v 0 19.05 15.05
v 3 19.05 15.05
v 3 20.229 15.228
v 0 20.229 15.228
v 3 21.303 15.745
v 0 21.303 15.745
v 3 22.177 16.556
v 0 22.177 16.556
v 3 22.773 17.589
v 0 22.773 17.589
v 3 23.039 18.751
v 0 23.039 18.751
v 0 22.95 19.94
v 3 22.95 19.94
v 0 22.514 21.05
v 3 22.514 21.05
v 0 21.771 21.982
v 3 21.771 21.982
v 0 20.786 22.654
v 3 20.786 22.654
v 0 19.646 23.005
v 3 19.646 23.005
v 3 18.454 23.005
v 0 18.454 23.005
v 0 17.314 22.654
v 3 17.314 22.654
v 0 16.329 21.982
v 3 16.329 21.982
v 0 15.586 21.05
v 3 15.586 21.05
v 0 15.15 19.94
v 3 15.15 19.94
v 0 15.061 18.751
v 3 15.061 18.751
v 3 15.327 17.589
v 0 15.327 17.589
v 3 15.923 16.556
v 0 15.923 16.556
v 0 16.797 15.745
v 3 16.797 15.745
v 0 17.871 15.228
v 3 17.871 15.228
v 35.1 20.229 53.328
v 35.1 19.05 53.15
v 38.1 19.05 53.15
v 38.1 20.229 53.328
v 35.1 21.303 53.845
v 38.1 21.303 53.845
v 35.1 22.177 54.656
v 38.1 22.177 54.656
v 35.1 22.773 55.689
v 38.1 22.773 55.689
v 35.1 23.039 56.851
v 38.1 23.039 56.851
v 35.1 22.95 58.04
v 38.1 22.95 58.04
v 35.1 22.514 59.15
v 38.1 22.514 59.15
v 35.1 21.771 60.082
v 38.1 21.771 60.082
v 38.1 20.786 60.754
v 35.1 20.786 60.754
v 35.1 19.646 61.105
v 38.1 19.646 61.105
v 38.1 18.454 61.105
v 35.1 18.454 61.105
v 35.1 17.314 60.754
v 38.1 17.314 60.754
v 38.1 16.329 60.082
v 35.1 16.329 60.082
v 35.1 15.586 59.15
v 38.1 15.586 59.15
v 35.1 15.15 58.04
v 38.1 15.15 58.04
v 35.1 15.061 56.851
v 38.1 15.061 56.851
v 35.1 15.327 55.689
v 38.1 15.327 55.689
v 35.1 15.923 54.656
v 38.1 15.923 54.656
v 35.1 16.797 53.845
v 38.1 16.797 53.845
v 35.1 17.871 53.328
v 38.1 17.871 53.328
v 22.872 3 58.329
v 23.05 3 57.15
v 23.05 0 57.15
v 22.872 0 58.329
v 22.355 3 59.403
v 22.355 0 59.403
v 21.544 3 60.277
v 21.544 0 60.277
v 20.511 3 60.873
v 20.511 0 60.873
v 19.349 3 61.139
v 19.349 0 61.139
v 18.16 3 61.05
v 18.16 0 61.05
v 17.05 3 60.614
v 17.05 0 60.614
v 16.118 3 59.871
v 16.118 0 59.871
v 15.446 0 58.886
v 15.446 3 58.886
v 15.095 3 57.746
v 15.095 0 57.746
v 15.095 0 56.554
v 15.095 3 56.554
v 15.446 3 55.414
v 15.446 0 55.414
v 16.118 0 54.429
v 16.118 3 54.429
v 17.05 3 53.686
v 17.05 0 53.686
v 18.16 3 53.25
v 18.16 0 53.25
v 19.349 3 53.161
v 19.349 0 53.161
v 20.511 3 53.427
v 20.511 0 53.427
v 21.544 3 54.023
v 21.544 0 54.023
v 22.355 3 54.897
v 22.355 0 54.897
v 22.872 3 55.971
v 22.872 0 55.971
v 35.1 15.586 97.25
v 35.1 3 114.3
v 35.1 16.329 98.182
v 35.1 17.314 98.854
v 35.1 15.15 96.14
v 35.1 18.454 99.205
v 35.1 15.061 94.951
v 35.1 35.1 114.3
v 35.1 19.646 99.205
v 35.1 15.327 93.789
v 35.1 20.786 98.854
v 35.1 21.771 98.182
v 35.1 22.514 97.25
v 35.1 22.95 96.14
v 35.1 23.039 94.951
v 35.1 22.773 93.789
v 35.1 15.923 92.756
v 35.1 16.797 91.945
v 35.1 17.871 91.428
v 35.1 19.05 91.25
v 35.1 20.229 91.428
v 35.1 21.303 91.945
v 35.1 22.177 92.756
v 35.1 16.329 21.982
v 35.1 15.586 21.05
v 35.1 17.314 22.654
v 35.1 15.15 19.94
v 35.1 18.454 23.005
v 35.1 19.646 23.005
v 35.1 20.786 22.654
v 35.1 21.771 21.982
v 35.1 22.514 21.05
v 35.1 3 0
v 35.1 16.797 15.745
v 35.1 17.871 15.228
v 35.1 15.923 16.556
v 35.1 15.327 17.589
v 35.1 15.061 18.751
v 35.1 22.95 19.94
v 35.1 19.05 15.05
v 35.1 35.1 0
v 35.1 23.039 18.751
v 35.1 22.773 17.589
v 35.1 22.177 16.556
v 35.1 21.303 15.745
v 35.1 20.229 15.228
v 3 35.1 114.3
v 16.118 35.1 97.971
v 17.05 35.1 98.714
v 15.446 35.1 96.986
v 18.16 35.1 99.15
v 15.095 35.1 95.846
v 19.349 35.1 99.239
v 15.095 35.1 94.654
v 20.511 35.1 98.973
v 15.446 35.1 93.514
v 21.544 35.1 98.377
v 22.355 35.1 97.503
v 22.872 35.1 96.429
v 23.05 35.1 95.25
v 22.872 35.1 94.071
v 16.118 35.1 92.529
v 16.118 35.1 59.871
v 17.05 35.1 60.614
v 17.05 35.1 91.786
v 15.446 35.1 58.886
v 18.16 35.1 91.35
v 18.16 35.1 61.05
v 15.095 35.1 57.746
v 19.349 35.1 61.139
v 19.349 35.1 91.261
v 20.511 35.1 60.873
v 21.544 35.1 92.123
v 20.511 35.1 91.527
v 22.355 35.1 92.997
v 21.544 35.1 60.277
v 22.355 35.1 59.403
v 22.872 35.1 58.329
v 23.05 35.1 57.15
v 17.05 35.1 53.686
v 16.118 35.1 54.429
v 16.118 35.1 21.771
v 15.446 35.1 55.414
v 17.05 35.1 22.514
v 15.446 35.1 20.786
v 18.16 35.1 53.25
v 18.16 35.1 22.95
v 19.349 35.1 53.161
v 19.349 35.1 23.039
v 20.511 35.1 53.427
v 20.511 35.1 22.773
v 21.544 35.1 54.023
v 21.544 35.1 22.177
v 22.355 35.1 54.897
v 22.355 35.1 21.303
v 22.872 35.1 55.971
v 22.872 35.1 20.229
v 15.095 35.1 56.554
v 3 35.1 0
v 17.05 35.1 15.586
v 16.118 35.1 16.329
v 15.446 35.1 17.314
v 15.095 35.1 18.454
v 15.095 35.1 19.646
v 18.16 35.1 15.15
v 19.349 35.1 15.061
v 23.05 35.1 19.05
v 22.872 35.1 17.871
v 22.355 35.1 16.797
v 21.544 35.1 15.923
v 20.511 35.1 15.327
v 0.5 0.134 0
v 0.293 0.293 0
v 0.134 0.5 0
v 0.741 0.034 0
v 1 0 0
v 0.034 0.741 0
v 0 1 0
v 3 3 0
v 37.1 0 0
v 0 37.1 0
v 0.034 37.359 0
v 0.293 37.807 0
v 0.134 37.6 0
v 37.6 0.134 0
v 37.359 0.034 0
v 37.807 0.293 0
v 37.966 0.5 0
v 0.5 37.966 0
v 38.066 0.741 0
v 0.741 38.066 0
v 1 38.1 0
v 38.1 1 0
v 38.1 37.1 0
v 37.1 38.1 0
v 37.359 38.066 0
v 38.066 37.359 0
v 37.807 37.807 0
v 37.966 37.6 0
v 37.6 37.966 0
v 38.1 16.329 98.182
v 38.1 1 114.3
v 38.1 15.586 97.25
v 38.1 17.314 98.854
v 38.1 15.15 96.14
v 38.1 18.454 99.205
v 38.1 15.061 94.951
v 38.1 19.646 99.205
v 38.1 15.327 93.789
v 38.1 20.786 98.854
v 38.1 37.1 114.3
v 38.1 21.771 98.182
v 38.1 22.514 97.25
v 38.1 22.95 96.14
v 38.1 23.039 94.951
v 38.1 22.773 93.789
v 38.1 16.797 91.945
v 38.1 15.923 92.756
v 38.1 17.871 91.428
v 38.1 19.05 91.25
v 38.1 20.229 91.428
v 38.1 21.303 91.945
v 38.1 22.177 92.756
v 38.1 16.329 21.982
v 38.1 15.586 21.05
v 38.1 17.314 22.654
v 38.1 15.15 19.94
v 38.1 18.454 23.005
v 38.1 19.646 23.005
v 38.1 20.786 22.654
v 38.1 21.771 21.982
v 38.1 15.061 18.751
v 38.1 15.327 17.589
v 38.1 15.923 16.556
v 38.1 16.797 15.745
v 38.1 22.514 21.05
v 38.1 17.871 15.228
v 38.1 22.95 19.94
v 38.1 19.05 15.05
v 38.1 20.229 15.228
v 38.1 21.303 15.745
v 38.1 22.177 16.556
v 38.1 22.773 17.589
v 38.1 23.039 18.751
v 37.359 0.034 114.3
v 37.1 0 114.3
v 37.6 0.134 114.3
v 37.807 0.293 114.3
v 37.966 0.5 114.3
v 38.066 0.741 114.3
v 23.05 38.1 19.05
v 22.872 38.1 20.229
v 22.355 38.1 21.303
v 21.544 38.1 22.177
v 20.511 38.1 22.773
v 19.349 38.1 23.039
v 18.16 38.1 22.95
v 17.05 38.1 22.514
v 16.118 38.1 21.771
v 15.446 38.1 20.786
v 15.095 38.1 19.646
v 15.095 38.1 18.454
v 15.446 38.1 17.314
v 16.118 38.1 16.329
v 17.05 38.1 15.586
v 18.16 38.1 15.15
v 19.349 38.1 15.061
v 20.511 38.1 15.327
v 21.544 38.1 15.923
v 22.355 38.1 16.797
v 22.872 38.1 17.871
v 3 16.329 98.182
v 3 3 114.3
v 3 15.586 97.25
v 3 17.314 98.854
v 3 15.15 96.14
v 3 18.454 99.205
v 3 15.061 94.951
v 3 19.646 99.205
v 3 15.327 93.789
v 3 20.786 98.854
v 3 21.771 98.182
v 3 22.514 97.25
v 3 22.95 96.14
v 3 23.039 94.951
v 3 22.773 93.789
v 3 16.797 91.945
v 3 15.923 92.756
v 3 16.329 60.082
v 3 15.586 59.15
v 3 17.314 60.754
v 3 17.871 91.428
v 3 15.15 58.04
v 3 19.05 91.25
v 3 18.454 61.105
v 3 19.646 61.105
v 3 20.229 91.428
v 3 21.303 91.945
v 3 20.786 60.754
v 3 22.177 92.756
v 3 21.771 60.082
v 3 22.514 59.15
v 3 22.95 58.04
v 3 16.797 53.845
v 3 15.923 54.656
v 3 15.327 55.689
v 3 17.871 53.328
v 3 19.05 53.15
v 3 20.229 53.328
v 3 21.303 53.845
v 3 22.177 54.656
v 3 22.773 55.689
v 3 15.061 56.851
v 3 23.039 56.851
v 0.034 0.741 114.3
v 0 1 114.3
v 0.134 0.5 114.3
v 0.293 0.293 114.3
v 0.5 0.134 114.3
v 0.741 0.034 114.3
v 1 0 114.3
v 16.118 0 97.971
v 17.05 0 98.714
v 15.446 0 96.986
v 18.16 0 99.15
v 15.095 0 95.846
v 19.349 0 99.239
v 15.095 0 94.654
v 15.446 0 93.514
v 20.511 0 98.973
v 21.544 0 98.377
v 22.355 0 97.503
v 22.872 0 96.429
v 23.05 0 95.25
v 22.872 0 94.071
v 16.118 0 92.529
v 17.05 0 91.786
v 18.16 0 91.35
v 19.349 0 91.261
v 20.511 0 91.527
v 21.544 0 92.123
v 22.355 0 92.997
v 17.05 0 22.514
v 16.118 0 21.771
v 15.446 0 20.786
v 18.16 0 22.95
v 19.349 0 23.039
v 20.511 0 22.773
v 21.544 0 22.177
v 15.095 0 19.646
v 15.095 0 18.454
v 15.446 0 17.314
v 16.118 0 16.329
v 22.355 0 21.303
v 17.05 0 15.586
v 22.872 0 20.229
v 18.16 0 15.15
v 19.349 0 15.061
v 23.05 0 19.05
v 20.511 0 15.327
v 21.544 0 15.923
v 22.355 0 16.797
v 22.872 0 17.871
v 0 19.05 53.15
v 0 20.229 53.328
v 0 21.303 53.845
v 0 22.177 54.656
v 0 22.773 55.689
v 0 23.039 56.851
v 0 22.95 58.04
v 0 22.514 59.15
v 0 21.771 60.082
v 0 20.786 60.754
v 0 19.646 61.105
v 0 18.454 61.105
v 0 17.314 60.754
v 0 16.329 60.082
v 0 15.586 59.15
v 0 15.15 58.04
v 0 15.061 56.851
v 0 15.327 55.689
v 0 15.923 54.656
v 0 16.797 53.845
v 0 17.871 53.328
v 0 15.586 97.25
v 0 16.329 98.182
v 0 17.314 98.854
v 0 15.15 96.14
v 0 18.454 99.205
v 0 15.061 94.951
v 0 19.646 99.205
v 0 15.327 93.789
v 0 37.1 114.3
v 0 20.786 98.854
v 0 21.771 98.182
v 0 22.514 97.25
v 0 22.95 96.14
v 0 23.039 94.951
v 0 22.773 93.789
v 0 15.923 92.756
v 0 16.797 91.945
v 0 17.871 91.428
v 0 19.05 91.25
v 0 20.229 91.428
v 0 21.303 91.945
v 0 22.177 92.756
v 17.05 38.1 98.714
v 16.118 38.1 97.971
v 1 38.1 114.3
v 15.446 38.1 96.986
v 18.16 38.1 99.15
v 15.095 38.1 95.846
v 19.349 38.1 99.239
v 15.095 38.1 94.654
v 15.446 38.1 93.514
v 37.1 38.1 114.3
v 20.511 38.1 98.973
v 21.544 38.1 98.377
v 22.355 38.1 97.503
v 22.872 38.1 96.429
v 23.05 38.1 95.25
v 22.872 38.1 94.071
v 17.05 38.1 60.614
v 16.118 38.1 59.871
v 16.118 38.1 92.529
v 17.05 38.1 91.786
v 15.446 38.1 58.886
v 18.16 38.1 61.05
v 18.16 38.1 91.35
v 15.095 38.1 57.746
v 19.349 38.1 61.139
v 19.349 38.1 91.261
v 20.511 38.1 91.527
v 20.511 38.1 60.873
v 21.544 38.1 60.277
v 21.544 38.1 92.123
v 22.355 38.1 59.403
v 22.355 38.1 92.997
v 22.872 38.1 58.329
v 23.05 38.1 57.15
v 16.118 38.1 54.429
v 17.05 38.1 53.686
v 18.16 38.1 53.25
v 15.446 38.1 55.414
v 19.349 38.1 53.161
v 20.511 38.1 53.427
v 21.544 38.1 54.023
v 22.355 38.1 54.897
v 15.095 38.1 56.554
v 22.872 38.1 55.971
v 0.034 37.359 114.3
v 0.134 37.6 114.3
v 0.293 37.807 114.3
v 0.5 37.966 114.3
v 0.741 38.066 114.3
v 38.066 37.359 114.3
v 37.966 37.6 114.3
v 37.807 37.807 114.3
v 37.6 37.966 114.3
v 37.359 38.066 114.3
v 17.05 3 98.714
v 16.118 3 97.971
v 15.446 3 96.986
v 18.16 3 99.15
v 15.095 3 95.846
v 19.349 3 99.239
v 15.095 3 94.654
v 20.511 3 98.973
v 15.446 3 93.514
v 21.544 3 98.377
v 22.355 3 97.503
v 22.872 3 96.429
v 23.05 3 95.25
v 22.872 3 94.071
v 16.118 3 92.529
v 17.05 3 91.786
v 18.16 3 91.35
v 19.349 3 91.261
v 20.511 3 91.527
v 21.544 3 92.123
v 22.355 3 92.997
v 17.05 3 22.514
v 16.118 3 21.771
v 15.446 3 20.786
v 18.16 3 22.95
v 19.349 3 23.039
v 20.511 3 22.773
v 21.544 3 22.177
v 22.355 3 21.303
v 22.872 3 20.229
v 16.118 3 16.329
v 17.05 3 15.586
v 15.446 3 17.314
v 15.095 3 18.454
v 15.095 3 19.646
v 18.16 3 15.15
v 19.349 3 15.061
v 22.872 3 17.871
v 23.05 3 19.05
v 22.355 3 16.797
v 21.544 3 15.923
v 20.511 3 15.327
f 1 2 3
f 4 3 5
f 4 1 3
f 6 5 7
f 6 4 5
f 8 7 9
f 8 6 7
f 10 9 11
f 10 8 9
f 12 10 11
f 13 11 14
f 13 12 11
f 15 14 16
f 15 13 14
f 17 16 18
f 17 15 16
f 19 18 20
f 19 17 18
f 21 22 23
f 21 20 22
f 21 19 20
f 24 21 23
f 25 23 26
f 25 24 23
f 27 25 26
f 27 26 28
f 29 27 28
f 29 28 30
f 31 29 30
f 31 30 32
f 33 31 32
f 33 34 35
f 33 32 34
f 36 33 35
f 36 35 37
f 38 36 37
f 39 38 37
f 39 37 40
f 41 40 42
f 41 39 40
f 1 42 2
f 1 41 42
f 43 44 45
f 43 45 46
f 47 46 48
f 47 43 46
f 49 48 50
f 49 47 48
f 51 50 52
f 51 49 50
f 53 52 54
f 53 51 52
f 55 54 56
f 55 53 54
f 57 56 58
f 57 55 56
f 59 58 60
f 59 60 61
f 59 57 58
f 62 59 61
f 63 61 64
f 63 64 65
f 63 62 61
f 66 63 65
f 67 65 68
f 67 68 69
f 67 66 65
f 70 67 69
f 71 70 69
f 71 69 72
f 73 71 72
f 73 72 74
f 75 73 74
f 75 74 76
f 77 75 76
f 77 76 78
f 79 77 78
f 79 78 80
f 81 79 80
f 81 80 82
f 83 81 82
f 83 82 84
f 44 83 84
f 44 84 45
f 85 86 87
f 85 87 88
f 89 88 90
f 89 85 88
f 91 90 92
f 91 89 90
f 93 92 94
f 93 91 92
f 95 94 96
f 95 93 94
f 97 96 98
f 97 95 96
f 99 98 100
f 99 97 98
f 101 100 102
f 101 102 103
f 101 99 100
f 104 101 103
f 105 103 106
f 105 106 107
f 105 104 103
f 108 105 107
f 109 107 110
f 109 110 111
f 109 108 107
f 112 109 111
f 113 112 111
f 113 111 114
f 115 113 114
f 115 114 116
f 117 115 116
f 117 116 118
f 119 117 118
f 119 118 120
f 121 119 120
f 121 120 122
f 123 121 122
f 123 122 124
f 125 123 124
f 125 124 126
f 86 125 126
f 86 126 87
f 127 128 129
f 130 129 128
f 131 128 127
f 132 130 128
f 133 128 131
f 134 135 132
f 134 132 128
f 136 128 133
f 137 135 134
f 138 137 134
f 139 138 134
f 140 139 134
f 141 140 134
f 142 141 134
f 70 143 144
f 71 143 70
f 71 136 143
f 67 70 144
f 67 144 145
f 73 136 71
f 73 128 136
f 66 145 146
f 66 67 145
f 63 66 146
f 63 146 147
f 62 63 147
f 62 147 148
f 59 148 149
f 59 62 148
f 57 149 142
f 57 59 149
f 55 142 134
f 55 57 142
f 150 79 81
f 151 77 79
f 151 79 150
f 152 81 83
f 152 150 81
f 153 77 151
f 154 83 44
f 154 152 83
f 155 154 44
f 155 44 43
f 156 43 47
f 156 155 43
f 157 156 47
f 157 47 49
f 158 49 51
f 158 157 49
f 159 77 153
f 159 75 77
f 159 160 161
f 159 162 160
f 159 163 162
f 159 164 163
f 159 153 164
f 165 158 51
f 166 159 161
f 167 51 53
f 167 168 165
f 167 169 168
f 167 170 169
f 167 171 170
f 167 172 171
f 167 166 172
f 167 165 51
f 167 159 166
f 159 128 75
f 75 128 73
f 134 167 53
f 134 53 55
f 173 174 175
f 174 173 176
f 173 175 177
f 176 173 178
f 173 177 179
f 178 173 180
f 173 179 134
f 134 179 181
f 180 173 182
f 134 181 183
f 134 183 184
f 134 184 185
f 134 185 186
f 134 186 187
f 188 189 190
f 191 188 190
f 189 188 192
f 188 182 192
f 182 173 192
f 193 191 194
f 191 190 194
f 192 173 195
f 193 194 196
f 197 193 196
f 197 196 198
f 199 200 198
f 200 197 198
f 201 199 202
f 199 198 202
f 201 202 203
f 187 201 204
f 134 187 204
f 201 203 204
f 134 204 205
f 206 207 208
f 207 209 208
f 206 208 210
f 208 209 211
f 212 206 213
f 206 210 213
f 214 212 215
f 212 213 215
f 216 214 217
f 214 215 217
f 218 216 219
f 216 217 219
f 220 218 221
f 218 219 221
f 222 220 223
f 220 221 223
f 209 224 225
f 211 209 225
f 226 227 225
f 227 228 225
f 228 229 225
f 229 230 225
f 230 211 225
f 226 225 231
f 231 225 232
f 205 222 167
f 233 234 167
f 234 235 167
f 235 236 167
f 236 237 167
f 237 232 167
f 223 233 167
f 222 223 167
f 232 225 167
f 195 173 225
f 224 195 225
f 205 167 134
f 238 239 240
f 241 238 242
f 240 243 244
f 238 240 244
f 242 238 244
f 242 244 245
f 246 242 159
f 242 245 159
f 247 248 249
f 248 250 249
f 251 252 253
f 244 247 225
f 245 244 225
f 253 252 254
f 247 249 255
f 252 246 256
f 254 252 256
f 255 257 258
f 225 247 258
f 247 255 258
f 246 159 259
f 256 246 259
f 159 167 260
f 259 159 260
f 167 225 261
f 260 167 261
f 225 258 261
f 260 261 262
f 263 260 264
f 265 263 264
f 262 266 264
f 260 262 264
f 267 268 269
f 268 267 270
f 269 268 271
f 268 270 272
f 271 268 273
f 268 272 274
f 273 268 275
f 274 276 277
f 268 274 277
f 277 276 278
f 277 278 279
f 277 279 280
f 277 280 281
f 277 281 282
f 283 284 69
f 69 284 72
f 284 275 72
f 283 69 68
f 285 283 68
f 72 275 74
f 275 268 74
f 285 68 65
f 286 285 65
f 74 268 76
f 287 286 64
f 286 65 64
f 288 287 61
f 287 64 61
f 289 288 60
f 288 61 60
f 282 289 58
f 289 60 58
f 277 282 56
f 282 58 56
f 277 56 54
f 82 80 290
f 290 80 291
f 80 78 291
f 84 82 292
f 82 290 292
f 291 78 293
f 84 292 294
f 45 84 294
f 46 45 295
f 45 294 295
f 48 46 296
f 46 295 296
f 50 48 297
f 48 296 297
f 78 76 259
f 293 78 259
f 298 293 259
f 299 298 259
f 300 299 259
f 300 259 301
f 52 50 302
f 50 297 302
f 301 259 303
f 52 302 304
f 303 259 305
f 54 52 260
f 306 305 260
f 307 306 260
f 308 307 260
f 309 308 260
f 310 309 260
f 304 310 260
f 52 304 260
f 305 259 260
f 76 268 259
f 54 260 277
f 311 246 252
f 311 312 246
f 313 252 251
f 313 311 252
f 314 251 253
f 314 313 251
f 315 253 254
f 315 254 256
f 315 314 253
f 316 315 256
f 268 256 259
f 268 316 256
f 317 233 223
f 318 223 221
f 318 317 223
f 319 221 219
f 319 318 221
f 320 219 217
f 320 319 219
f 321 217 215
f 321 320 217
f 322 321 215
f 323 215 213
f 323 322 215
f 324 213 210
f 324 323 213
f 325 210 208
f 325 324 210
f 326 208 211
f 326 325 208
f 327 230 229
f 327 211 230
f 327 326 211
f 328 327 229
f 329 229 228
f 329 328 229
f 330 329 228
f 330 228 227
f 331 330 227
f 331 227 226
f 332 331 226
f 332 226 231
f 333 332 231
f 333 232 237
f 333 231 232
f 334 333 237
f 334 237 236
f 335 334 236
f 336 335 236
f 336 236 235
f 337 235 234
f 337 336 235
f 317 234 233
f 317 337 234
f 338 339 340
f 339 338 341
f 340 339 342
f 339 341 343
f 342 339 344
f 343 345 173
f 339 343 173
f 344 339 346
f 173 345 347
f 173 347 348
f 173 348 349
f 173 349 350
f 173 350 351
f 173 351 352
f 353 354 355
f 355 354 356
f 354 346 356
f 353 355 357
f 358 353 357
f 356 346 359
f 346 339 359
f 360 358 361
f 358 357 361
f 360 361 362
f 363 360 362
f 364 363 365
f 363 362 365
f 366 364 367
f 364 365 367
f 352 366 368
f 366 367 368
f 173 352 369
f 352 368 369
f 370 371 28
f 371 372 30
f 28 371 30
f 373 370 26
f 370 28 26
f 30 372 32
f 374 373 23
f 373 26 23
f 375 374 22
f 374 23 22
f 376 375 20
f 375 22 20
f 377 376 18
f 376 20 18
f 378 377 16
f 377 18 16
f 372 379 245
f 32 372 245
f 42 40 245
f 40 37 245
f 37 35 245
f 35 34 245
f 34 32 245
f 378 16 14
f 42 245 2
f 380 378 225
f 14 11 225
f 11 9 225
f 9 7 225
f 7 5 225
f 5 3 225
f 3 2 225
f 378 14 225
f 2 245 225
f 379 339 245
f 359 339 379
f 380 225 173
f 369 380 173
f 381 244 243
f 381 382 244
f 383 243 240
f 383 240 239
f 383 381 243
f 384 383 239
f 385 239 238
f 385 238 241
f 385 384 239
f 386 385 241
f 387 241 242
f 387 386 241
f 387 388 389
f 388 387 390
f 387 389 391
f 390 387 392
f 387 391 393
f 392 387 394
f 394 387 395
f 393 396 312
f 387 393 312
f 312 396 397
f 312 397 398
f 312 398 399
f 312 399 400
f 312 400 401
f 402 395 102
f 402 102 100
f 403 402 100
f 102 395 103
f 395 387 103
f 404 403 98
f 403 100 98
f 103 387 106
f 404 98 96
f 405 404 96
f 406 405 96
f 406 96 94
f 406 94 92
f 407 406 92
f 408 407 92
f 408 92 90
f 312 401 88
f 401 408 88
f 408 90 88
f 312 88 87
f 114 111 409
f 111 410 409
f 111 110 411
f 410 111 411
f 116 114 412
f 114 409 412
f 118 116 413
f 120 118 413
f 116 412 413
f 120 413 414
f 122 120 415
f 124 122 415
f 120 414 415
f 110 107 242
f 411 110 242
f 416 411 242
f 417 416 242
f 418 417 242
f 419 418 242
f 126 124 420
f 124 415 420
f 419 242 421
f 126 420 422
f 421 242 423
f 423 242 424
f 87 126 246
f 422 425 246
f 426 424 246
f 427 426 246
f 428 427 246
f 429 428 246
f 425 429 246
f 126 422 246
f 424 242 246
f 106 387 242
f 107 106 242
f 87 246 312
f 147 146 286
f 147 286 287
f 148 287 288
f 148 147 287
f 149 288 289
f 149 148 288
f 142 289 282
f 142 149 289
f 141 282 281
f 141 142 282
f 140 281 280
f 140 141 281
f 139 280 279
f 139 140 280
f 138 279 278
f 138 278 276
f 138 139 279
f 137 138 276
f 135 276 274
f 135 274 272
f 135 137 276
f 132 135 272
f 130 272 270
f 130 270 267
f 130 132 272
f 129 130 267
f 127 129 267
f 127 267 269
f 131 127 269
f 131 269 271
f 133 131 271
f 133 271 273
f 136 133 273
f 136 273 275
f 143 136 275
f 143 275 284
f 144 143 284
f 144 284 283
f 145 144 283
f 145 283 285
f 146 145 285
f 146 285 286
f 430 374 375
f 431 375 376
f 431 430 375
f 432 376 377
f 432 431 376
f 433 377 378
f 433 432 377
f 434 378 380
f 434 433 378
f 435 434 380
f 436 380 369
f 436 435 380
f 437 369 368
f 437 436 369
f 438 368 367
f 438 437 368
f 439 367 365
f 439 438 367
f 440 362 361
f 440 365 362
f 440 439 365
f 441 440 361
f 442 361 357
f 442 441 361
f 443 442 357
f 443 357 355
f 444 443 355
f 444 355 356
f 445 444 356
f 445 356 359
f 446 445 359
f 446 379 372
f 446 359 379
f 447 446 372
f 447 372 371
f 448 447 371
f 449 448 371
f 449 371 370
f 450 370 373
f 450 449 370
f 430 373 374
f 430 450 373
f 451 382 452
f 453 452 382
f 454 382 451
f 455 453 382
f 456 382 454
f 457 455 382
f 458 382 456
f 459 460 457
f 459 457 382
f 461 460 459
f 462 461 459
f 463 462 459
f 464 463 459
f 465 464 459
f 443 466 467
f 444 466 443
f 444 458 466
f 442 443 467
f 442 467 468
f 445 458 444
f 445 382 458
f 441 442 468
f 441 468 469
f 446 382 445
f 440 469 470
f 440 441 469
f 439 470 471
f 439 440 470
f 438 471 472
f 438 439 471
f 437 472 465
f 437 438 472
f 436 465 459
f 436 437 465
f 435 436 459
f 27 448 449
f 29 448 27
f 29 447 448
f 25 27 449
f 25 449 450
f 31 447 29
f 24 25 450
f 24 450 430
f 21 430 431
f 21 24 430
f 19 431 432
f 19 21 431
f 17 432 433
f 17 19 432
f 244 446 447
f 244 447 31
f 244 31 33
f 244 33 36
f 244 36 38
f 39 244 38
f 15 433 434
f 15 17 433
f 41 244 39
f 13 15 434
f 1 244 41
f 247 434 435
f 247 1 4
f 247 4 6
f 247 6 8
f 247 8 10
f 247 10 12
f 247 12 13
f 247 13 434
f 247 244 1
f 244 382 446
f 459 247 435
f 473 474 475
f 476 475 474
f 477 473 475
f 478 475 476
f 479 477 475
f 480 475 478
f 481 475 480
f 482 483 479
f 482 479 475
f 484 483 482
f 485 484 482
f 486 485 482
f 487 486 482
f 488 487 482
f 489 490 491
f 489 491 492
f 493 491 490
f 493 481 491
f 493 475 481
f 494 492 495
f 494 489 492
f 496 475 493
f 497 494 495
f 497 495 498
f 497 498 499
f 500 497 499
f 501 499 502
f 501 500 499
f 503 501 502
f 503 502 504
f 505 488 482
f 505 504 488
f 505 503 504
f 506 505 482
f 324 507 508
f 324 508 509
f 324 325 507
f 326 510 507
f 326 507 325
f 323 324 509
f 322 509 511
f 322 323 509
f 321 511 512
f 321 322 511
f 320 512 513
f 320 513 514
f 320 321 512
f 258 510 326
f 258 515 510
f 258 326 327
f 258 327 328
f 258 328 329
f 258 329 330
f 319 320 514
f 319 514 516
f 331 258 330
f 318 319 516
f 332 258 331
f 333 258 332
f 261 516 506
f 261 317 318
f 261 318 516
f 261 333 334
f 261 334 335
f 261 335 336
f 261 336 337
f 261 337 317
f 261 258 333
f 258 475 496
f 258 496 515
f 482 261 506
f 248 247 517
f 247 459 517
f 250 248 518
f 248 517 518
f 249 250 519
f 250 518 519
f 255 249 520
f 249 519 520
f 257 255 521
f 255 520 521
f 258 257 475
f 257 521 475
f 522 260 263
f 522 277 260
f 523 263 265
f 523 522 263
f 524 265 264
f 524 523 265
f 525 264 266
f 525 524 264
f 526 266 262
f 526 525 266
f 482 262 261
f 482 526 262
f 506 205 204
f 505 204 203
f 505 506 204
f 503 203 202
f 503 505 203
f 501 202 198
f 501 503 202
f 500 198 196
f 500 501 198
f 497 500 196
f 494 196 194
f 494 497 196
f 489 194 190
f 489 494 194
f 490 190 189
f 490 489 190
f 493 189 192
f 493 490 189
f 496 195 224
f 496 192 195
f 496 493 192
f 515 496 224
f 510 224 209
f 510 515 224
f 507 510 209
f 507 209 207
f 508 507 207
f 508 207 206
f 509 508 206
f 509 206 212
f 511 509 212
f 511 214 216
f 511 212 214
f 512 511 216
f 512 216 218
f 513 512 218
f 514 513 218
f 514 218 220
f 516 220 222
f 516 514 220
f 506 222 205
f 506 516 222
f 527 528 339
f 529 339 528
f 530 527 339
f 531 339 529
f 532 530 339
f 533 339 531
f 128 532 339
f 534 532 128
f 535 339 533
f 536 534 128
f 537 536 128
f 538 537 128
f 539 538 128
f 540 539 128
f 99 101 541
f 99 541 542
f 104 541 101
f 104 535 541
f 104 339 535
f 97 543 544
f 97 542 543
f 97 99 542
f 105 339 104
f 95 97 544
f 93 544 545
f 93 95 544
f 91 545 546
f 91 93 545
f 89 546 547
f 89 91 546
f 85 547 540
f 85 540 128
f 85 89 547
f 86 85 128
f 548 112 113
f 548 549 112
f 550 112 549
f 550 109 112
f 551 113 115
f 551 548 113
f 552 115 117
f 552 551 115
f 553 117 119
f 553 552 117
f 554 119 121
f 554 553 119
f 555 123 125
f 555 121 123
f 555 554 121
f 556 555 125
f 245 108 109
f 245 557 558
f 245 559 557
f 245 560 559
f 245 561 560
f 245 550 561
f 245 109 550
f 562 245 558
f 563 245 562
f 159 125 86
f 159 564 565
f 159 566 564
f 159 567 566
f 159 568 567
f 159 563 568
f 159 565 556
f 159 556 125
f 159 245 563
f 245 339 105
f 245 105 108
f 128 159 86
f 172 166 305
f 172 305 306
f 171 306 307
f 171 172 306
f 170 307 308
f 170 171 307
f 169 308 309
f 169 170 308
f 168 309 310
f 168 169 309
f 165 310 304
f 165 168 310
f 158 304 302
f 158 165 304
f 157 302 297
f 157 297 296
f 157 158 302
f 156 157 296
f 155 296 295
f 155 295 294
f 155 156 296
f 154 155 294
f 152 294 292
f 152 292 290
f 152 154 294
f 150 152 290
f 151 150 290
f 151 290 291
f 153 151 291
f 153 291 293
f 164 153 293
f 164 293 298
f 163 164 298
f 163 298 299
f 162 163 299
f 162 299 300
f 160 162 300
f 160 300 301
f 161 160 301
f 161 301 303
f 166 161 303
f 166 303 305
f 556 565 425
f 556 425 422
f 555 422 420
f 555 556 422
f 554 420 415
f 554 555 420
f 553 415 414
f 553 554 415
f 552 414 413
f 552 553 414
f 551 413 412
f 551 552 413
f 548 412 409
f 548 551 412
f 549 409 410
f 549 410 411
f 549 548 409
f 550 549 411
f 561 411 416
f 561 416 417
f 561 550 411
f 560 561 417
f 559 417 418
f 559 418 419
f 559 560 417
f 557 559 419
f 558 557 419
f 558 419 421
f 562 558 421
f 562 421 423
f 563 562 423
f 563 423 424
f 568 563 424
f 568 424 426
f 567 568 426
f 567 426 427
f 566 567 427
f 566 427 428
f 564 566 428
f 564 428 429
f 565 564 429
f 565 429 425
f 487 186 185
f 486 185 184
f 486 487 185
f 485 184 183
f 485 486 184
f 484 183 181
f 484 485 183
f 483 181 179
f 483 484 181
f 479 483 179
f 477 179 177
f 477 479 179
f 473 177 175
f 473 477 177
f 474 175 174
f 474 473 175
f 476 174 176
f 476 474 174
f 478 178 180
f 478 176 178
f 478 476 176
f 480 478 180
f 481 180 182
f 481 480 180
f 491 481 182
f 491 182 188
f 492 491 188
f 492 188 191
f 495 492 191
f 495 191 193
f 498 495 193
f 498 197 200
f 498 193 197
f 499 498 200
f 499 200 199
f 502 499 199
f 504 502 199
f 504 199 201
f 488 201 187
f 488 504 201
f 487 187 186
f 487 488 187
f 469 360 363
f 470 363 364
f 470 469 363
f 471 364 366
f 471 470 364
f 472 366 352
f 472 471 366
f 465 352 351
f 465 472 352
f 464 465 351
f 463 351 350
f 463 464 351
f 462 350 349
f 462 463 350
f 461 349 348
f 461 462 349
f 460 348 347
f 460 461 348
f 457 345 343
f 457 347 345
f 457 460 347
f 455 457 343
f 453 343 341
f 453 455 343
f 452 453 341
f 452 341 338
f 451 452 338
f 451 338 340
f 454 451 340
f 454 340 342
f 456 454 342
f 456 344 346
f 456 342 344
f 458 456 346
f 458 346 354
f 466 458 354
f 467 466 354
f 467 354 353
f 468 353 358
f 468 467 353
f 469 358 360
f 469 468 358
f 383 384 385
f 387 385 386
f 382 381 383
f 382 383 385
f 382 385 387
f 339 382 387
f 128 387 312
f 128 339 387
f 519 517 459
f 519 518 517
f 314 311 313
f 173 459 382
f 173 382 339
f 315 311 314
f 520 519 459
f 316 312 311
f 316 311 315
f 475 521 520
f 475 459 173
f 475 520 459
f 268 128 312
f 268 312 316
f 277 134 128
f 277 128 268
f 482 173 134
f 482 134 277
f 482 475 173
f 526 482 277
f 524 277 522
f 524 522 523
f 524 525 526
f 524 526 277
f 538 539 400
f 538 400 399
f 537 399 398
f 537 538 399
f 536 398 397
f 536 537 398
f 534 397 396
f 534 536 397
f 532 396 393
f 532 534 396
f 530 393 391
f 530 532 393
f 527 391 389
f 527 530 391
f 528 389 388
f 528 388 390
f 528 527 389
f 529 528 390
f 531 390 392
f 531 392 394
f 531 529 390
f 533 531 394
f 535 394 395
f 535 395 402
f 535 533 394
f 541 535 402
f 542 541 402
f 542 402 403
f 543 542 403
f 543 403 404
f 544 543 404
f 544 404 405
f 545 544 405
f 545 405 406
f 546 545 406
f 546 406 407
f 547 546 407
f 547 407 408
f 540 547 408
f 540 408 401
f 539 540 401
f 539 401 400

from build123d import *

# Parameters (mm, degrees)
BOX001_W               = 32.1
BOX001_H               = 32.1
BOX001_DEPTH           = 114.3
CYLINDER_R             = 4
CYLINDER_DEPTH         = 38.1
CYLINDER_PITCH_ANGLE   = 90
ARRAY001_Z_COUNT       = 3
ARRAY001_Z_PITCH       = 38.1
CYLINDER001_R          = 4
CYLINDER001_DEPTH      = 38.1
CYLINDER001_ROLL_ANGLE = 90
ARRAY_Z_COUNT          = 3
ARRAY_Z_PITCH          = 38.1
BOX_W                  = 38.1
BOX_H                  = 38.1
BOX_DEPTH              = 114.3
FILLET_R               = 1


with BuildPart() as cutout:
    # Box001 → Box001 (new body)
    with BuildSketch(Plane(origin=(3, 3, 0), x_dir=(1, 0, 0), z_dir=(0, 0, 1))):
        with Locations((16.05, 16.05)):
            Rectangle(BOX001_W, BOX001_H)
    extrude(amount=BOX001_DEPTH)


with BuildPart() as holes2:
    # Cylinder → Cylinder (new body)
    with BuildSketch(Plane.XY):
        Circle(CYLINDER_R)
    extrude(amount=CYLINDER_DEPTH)


with BuildPart() as holes2_1:
    # Cylinder pitch: moved
    add(holes2.part.rotate(Axis((0, 0, 0), (0, 1, 0)), CYLINDER_PITCH_ANGLE))


with BuildPart() as holes2_2:
    # Cylinder placement: moved
    add(holes2_1.part.moved(Location((0, 19.05, 19.05))))

    # Array001 Z: Holes2 ×3


with BuildPart() as holes2_3:
    add(holes2_2.part)
    with Locations(*[(0, 0, i * ARRAY001_Z_PITCH) for i in range(1, ARRAY001_Z_COUNT)]):
        add(holes2_2.part)


with BuildPart() as holes1:
    # Cylinder001 → Cylinder001 (new body)
    with BuildSketch(Plane.XY):
        Circle(CYLINDER001_R)
    extrude(amount=CYLINDER001_DEPTH)


with BuildPart() as holes1_1:
    # Cylinder001 roll: moved
    add(holes1.part.rotate(Axis((0, 0, 0), (1, 0, 0)), CYLINDER001_ROLL_ANGLE))


with BuildPart() as holes1_2:
    # Cylinder001 placement: moved
    add(holes1_1.part.moved(Location((19.05, 38.1, 19.05))))

    # Array Z: Holes1 ×3


with BuildPart() as holes1_3:
    add(holes1_2.part)
    with Locations(*[(0, 0, i * ARRAY_Z_PITCH) for i in range(1, ARRAY_Z_COUNT)]):
        add(holes1_2.part)


with BuildPart() as cut002:
    # Box → Box (new body)
    with BuildSketch(Plane.XY):
        with Locations((19.05, 19.05)):
            Rectangle(BOX_W, BOX_H)
    extrude(amount=BOX_DEPTH)

    # Fillet
    fillet_edges = [cut002.edges().sort_by_distance(p)[0] for p in [
        (0, 0, 57.15),
        (38.1, 0, 57.15),
        (38.1, 38.1, 57.15),
        (0, 38.1, 57.15),
    ]]
    fillet(fillet_edges, radius=FILLET_R)

    # Cut: cut Holes1
    add(holes1_3.part, mode=Mode.SUBTRACT)

    # Cut001: cut Holes2
    add(holes2_3.part, mode=Mode.SUBTRACT)

    # Cut002: cut Cutout
    add(cutout.part, mode=Mode.SUBTRACT)


solid = cut002.part
